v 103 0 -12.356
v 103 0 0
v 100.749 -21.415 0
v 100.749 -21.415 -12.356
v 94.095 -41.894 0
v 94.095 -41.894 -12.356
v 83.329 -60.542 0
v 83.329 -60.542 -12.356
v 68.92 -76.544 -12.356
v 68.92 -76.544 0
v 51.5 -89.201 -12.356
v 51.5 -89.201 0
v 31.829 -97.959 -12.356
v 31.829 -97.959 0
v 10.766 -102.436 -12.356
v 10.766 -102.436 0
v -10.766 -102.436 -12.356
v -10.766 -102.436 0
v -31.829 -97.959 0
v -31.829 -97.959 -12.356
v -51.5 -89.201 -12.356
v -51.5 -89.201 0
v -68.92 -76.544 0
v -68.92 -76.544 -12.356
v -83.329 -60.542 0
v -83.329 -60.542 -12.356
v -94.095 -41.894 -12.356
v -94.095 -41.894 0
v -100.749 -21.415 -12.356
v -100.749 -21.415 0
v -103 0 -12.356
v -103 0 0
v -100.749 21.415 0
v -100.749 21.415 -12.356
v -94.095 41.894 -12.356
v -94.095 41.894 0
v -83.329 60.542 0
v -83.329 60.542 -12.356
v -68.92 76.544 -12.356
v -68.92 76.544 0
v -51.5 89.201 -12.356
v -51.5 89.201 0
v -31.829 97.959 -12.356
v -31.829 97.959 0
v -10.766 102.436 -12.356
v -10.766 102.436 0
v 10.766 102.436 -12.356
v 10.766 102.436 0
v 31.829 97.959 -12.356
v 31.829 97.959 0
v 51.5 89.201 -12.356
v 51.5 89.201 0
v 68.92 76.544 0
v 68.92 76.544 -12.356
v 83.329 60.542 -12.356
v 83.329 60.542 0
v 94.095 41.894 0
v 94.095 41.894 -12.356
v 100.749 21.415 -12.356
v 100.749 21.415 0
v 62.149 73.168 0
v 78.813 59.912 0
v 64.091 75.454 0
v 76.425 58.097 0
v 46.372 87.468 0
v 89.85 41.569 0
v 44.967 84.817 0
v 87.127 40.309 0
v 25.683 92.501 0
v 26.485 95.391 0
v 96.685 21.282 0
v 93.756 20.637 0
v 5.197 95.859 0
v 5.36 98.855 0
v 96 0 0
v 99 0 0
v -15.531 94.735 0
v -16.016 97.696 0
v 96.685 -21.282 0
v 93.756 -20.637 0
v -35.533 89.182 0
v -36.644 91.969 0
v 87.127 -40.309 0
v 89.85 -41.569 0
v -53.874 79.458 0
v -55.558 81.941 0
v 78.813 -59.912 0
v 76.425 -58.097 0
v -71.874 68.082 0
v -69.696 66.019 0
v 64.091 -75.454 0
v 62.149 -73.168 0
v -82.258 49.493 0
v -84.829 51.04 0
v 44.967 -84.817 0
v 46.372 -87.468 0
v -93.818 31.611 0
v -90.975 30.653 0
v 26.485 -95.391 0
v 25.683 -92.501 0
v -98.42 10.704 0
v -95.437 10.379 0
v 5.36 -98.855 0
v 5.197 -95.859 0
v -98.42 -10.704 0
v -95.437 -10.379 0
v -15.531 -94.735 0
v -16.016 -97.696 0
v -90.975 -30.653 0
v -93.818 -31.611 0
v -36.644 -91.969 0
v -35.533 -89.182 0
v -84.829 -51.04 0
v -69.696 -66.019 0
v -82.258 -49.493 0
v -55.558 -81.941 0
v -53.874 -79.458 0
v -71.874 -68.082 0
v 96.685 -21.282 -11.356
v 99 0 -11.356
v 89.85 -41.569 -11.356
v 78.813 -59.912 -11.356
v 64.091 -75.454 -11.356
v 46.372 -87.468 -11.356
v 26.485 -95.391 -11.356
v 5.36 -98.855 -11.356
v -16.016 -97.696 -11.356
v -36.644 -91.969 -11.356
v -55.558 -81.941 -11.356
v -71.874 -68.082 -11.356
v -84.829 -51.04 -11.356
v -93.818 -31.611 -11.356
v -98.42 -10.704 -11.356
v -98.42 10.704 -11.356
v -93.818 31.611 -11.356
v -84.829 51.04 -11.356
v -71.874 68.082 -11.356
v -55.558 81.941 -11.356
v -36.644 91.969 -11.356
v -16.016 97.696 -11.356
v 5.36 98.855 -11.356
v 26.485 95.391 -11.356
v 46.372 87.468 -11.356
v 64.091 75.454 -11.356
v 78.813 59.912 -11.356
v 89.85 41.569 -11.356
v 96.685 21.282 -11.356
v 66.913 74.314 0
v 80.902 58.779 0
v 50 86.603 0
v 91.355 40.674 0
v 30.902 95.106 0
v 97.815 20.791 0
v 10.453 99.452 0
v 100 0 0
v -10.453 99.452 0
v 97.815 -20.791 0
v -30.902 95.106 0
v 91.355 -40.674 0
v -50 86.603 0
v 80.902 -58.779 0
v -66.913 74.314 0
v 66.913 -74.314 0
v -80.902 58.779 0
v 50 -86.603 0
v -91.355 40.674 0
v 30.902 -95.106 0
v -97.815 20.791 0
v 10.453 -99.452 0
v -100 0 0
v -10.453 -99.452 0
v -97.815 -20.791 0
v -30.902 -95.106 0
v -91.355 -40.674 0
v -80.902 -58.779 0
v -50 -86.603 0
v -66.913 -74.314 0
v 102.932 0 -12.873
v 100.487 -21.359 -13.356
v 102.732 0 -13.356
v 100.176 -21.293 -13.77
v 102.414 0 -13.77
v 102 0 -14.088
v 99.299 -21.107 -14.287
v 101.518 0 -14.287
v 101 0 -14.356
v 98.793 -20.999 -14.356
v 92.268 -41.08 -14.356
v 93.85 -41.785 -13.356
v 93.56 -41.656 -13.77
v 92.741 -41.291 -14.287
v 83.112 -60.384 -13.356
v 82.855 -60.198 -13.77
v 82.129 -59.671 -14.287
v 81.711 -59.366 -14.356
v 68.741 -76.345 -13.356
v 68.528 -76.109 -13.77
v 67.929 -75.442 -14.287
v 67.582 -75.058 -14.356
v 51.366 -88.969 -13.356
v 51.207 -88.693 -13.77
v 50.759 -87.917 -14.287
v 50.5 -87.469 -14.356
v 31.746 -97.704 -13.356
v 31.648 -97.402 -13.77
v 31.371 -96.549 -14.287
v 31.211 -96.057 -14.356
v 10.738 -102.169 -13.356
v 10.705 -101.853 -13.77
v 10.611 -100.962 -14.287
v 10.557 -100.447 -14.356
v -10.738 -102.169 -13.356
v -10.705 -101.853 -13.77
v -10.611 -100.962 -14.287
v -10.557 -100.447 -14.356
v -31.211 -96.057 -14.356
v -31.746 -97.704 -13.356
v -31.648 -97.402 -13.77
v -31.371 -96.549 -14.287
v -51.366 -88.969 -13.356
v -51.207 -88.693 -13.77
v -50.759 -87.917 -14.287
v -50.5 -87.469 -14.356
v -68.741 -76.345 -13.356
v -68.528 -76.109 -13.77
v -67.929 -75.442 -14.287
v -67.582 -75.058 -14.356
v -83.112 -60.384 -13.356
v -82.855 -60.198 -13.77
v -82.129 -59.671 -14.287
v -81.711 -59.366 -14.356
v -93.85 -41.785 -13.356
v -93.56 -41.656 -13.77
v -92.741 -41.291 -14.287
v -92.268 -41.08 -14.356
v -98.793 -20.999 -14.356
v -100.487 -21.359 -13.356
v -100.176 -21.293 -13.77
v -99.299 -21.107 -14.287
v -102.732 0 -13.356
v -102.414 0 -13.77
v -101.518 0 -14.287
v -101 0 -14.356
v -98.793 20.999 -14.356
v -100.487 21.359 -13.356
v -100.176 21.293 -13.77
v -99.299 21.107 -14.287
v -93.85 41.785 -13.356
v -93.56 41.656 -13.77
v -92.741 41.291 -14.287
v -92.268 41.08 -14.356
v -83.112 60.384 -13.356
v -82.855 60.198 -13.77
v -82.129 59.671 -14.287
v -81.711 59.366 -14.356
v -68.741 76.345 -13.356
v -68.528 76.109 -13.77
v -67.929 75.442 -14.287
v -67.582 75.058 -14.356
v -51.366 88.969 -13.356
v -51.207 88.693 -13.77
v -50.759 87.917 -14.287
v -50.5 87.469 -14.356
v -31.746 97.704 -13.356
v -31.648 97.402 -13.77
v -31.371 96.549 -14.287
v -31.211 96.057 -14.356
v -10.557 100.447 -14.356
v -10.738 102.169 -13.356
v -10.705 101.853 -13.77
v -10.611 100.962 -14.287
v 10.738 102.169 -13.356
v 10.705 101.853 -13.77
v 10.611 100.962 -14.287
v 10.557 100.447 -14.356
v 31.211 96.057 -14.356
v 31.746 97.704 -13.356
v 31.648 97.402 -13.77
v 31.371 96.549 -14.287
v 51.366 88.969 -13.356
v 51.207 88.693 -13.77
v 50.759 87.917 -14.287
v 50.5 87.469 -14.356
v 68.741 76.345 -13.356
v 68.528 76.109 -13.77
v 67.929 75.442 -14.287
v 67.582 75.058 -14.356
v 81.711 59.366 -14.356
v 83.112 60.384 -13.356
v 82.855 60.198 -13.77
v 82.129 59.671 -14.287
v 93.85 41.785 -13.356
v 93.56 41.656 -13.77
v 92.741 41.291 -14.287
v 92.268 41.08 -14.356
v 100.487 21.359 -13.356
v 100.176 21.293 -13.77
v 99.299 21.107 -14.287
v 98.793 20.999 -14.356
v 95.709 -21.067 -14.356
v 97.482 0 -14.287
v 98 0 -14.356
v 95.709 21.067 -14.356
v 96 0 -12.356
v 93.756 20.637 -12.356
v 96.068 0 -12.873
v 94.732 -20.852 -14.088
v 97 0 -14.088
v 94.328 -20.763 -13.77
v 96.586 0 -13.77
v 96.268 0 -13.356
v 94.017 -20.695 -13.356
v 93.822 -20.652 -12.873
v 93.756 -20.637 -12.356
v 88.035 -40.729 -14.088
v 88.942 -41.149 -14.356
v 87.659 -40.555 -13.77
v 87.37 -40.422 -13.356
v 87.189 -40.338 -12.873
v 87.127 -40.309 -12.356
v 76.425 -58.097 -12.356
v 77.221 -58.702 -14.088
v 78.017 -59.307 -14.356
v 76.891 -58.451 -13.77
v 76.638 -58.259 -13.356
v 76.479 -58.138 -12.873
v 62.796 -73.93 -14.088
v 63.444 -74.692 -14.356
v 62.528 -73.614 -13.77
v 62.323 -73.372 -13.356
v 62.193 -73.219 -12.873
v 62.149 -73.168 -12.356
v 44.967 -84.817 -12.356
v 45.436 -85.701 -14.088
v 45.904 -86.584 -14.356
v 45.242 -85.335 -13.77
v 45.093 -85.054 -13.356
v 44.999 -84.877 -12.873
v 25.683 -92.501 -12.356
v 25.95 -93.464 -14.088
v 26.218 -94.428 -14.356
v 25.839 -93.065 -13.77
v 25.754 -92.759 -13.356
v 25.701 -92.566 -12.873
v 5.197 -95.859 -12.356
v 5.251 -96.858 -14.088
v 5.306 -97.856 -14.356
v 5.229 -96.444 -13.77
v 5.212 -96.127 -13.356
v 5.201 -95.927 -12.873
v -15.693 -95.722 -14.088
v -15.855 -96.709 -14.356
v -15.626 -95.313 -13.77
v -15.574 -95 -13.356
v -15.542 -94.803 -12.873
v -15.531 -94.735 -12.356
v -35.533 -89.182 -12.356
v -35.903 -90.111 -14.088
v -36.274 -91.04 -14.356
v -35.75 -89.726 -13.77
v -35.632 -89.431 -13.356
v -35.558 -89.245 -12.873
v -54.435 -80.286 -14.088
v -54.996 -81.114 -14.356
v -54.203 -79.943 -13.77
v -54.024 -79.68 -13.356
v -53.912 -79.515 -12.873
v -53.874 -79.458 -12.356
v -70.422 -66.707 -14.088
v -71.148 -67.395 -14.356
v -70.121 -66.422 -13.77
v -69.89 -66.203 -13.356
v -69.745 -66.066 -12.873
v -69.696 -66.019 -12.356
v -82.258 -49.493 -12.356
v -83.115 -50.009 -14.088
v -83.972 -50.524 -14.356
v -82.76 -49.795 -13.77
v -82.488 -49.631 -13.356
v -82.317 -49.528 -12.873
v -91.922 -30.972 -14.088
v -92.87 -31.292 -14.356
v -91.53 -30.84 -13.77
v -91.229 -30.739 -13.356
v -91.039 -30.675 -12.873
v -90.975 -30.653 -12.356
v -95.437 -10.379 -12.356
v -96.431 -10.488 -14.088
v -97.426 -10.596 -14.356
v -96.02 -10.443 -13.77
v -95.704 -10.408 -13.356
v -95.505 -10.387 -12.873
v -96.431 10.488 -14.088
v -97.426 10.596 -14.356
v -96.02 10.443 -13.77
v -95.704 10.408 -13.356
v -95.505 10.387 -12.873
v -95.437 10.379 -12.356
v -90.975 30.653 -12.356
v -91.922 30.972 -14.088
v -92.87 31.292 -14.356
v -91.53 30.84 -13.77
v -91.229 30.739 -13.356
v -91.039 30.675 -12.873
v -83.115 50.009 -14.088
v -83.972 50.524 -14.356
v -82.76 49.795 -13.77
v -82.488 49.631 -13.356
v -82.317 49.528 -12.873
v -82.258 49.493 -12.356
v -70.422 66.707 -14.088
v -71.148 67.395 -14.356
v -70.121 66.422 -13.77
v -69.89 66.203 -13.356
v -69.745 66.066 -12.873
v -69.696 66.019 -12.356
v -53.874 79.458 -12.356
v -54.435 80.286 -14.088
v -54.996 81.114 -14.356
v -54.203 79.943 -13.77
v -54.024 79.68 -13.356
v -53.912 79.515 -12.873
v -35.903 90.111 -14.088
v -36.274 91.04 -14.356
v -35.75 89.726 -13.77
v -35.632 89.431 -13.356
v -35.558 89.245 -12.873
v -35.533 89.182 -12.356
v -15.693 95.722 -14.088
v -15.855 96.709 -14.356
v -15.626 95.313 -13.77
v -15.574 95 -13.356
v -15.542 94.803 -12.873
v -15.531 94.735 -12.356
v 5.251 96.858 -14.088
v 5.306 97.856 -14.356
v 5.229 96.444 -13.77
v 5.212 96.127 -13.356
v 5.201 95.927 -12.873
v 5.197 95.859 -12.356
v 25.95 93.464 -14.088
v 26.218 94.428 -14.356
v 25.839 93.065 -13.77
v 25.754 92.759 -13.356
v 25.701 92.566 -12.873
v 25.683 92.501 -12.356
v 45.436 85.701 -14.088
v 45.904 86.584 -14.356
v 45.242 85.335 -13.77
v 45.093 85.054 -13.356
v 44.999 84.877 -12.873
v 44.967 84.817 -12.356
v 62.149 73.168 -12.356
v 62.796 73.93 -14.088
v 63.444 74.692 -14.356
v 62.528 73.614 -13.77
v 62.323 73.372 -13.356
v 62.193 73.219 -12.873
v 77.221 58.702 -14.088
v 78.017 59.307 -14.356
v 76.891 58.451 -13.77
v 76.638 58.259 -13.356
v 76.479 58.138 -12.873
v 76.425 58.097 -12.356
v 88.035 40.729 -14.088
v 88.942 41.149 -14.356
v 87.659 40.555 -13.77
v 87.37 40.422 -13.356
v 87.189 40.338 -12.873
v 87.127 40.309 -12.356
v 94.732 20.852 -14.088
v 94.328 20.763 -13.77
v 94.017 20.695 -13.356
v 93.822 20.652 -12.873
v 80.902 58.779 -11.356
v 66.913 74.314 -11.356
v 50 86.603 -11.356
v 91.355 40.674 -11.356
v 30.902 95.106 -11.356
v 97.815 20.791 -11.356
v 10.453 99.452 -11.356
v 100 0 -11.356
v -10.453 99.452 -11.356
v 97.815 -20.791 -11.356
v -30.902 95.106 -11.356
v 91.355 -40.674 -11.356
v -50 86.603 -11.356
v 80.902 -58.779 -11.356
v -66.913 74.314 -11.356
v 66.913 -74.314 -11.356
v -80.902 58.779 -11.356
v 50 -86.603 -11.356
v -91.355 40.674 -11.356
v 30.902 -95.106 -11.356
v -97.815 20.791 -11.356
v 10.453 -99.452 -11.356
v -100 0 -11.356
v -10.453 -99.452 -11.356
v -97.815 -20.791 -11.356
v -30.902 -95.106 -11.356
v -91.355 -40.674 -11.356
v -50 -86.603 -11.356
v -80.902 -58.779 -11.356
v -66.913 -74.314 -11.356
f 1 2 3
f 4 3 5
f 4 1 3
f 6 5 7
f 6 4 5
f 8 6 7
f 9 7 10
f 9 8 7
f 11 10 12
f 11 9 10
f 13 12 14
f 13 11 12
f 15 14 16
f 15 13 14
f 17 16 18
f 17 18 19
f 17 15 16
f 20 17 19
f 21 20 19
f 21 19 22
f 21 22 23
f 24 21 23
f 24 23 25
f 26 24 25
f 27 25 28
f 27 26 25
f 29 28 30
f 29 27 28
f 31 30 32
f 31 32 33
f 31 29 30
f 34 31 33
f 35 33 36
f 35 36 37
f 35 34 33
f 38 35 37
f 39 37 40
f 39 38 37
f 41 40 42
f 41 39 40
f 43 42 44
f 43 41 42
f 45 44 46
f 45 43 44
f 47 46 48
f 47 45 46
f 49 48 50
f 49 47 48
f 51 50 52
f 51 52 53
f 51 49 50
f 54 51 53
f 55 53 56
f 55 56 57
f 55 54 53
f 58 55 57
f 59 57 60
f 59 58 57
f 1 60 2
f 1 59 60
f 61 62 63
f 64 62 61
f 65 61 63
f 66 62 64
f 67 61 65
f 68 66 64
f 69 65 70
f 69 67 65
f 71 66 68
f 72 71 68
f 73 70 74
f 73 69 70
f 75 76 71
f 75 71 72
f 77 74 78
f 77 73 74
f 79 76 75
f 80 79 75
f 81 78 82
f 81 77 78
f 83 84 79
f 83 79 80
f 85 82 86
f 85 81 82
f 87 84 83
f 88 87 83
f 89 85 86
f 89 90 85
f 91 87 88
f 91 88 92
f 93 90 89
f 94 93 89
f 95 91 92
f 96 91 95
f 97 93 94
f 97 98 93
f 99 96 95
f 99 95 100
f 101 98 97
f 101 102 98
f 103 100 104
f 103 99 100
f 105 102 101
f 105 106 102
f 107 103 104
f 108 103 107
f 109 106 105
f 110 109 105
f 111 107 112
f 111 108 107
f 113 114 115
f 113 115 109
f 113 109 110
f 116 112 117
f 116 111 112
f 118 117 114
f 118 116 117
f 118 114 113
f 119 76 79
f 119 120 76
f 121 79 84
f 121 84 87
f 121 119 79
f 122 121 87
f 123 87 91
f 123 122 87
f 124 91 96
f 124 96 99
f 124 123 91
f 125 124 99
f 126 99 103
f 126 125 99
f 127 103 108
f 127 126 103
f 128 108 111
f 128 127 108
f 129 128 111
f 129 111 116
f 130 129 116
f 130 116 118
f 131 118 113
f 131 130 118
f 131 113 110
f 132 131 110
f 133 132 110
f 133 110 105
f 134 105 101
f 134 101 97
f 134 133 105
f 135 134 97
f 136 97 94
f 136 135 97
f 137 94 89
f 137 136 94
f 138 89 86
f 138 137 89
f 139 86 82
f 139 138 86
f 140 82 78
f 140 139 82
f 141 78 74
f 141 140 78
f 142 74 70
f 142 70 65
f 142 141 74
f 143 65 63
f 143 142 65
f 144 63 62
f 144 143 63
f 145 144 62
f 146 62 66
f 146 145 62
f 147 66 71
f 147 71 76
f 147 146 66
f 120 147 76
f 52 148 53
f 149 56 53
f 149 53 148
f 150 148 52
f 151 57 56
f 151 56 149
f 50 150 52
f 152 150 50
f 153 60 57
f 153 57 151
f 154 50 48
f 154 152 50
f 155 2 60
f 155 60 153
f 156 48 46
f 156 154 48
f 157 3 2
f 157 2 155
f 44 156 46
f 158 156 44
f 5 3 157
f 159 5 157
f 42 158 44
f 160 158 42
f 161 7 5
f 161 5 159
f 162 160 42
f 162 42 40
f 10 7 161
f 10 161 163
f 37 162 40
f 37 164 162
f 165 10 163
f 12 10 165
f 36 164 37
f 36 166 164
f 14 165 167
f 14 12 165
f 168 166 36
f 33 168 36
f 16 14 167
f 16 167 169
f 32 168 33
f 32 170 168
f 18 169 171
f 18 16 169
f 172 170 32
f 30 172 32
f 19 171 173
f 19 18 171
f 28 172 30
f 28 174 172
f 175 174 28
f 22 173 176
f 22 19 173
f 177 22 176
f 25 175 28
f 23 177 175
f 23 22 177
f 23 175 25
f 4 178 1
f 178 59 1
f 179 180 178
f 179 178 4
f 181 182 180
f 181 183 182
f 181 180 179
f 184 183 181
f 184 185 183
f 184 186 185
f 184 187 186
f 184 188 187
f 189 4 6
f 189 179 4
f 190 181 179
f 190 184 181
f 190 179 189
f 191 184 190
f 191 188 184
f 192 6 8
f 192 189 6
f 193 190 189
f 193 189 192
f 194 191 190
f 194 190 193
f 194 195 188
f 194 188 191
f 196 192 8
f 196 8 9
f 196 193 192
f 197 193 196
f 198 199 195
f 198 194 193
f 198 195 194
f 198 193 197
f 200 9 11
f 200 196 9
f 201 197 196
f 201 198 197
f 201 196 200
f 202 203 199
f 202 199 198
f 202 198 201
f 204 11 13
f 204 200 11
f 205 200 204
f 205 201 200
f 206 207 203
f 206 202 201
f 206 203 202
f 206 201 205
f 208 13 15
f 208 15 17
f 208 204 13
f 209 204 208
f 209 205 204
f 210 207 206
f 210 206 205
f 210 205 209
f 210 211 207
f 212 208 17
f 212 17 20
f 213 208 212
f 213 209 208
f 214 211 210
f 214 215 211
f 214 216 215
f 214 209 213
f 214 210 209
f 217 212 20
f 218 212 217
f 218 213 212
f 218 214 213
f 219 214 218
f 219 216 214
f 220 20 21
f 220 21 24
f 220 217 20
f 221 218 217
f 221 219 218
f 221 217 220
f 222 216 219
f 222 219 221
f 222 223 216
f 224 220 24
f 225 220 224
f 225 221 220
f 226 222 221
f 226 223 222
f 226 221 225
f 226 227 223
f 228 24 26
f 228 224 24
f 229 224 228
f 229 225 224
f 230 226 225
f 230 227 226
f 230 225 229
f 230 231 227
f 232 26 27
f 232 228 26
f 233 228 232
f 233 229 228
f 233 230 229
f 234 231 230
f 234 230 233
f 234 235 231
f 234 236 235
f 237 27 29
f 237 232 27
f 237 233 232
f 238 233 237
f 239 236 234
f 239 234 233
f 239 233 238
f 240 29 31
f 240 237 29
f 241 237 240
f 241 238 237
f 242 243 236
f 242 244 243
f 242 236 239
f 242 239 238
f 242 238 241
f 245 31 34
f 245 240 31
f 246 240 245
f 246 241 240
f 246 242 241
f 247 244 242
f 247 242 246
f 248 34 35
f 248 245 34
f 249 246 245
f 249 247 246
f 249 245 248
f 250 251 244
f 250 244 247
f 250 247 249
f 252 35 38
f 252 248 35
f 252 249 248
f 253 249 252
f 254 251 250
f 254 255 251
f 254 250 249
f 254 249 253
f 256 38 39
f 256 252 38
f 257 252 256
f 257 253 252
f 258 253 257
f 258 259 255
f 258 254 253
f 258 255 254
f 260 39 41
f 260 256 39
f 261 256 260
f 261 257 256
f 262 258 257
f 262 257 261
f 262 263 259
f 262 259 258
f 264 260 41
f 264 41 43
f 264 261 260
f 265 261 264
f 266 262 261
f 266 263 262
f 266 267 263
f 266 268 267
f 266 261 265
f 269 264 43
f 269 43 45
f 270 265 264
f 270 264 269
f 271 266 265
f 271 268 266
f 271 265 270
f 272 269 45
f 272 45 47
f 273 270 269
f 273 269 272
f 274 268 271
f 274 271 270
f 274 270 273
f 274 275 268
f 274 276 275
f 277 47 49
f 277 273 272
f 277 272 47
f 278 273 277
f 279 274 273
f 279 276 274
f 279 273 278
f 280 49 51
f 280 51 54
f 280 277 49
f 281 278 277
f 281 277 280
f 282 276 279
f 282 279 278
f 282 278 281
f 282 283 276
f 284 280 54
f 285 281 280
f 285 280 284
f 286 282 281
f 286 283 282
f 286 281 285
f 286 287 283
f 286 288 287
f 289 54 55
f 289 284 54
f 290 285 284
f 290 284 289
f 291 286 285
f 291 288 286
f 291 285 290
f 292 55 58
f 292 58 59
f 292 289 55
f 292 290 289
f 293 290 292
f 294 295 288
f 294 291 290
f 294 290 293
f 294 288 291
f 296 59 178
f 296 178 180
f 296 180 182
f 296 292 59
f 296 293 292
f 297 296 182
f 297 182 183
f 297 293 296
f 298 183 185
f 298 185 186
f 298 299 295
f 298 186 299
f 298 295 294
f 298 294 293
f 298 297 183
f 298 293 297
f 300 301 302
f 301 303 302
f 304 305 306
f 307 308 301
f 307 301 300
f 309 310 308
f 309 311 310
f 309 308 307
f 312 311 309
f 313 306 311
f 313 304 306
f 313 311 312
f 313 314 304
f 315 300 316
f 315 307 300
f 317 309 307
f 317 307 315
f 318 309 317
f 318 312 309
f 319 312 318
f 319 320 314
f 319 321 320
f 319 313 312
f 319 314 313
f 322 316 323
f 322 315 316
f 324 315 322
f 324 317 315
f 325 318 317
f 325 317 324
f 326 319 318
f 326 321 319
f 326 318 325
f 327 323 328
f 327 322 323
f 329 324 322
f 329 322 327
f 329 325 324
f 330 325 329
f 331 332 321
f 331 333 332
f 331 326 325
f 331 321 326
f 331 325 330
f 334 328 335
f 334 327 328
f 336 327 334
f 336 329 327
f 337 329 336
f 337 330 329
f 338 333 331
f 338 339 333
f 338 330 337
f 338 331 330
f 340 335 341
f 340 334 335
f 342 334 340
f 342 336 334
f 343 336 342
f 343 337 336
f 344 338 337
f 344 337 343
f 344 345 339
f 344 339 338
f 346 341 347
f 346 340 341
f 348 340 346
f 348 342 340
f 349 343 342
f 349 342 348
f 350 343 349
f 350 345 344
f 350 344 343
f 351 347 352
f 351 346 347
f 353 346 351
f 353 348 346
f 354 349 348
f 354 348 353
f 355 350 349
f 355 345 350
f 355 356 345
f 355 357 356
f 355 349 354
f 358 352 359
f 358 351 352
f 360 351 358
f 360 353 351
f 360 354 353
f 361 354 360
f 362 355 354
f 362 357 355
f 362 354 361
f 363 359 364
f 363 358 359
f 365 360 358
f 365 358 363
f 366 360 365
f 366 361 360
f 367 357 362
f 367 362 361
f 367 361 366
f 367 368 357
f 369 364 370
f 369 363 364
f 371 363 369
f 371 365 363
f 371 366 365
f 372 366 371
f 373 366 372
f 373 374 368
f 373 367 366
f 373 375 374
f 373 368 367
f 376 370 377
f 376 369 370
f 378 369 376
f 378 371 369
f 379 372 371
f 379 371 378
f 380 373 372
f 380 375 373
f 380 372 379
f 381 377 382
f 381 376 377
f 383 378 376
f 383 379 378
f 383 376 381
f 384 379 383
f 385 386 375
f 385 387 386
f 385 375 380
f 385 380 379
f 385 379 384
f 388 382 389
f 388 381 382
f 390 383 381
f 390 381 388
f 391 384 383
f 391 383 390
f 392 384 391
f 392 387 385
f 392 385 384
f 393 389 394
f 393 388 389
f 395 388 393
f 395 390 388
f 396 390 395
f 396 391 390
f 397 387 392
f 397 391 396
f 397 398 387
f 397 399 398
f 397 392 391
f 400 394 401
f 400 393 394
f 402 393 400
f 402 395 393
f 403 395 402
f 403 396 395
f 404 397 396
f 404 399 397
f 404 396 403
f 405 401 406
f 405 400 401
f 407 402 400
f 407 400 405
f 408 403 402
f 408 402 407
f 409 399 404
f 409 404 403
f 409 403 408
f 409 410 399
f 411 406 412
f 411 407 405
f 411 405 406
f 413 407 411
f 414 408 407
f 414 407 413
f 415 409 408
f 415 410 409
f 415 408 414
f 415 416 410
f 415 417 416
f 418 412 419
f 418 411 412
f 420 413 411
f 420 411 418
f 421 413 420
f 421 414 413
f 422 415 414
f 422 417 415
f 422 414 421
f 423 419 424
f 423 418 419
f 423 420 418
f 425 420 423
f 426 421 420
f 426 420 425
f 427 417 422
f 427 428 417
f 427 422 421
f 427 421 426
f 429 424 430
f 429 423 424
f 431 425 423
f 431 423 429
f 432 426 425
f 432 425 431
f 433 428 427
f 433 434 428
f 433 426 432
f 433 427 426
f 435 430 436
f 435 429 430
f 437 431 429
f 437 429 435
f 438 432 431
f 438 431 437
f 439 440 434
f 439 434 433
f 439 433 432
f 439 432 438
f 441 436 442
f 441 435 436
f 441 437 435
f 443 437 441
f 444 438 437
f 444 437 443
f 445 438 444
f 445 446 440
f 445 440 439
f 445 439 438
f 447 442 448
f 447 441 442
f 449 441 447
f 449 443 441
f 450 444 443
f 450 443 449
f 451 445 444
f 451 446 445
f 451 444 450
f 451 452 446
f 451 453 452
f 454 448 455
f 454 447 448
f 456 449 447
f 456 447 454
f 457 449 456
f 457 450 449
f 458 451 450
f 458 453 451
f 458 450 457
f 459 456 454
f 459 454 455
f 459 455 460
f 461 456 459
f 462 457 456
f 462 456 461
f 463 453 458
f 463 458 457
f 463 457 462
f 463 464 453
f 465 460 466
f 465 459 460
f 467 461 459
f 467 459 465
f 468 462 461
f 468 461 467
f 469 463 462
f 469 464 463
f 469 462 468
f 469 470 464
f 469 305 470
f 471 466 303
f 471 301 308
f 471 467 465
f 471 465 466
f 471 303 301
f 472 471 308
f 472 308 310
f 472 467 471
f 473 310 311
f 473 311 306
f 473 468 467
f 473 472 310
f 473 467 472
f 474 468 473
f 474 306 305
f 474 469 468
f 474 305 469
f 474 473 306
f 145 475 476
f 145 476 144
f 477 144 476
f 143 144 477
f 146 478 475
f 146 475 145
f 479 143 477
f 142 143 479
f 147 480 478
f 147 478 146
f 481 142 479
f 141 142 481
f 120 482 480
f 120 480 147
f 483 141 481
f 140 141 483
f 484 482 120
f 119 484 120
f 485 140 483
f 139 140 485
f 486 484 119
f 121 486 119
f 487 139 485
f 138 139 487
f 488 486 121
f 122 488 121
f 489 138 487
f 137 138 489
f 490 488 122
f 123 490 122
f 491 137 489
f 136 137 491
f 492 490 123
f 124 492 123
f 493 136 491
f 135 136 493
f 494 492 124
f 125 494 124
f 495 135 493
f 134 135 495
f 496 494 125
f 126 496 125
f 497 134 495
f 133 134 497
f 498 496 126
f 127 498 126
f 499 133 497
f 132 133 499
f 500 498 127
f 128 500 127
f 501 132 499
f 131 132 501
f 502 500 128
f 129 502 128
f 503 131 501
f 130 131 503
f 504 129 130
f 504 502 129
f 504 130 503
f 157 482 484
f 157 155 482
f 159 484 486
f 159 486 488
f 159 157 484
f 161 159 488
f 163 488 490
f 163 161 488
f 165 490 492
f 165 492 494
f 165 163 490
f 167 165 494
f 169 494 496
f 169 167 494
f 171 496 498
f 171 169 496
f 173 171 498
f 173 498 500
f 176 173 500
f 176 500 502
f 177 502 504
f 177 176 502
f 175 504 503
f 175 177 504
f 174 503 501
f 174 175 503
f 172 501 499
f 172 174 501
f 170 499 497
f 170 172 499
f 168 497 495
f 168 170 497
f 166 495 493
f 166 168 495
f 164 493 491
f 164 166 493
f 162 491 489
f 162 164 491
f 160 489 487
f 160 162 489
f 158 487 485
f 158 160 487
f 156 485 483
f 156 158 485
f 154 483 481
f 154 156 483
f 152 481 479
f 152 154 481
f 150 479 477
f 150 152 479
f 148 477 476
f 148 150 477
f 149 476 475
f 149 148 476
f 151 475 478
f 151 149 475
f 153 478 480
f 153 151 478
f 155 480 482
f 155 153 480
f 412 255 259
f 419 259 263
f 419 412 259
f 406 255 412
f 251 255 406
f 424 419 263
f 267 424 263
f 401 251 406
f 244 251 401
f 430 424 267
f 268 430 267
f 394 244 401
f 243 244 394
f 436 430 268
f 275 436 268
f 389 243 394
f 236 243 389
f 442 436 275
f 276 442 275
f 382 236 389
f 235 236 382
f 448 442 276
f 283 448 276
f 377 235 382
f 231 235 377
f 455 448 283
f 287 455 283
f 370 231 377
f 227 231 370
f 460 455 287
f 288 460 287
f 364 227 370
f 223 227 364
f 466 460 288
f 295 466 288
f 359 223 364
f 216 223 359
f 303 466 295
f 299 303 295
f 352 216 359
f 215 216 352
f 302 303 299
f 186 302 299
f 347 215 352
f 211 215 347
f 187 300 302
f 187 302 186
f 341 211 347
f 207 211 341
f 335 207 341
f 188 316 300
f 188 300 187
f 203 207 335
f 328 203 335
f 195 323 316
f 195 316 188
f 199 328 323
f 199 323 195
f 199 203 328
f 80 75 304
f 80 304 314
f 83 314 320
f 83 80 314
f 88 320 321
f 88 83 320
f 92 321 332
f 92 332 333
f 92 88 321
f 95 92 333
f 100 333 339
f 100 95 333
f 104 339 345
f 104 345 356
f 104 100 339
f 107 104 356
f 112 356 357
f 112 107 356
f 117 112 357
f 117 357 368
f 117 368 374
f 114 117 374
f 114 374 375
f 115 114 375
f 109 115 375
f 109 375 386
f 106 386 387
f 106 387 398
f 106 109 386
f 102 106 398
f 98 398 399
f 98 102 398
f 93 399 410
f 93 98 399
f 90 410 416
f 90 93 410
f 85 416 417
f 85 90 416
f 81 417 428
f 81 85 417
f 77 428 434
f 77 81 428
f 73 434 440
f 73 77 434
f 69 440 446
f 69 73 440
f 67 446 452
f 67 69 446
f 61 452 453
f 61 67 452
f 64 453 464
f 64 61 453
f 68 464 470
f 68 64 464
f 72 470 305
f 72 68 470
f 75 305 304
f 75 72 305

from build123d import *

# Parameters (mm, degrees)
FILLET2_R = 2
FILLET3_R = 2


with BuildPart() as part:
    # Sketch1 → Revolve1 (revolve)
    with BuildSketch(Plane(origin=(0, 0, 0), x_dir=(1, 0, 0), z_dir=(0, 1, 0)), mode=Mode.PRIVATE) as revolve1_sk:
        Polygon((-99, 0), (-99, 11.355578728), (-100, 11.355578728), (-100, 0), (-103, 0), (-103, 14.355578728), (-96, 14.355578728), (-96, 0), align=None)
    revolve(revolve1_sk.sketch.rotate(Axis((0, 0, 0), (0, 0, -1)), 180), axis=Axis((0, 0, 0), (0, 0, -1)))

    # Fillet2
    fillet2_edges = [part.edges().sort_by_distance(p)[0] for p in [
        (-103, 0, -14.355578728),
    ]]
    fillet(fillet2_edges, radius=FILLET2_R)

    # Fillet3
    fillet3_edges = [part.edges().sort_by_distance(p)[0] for p in [
        (-96, 0, -14.355578728),
    ]]
    fillet(fillet3_edges, radius=FILLET3_R)


solid = part.part
